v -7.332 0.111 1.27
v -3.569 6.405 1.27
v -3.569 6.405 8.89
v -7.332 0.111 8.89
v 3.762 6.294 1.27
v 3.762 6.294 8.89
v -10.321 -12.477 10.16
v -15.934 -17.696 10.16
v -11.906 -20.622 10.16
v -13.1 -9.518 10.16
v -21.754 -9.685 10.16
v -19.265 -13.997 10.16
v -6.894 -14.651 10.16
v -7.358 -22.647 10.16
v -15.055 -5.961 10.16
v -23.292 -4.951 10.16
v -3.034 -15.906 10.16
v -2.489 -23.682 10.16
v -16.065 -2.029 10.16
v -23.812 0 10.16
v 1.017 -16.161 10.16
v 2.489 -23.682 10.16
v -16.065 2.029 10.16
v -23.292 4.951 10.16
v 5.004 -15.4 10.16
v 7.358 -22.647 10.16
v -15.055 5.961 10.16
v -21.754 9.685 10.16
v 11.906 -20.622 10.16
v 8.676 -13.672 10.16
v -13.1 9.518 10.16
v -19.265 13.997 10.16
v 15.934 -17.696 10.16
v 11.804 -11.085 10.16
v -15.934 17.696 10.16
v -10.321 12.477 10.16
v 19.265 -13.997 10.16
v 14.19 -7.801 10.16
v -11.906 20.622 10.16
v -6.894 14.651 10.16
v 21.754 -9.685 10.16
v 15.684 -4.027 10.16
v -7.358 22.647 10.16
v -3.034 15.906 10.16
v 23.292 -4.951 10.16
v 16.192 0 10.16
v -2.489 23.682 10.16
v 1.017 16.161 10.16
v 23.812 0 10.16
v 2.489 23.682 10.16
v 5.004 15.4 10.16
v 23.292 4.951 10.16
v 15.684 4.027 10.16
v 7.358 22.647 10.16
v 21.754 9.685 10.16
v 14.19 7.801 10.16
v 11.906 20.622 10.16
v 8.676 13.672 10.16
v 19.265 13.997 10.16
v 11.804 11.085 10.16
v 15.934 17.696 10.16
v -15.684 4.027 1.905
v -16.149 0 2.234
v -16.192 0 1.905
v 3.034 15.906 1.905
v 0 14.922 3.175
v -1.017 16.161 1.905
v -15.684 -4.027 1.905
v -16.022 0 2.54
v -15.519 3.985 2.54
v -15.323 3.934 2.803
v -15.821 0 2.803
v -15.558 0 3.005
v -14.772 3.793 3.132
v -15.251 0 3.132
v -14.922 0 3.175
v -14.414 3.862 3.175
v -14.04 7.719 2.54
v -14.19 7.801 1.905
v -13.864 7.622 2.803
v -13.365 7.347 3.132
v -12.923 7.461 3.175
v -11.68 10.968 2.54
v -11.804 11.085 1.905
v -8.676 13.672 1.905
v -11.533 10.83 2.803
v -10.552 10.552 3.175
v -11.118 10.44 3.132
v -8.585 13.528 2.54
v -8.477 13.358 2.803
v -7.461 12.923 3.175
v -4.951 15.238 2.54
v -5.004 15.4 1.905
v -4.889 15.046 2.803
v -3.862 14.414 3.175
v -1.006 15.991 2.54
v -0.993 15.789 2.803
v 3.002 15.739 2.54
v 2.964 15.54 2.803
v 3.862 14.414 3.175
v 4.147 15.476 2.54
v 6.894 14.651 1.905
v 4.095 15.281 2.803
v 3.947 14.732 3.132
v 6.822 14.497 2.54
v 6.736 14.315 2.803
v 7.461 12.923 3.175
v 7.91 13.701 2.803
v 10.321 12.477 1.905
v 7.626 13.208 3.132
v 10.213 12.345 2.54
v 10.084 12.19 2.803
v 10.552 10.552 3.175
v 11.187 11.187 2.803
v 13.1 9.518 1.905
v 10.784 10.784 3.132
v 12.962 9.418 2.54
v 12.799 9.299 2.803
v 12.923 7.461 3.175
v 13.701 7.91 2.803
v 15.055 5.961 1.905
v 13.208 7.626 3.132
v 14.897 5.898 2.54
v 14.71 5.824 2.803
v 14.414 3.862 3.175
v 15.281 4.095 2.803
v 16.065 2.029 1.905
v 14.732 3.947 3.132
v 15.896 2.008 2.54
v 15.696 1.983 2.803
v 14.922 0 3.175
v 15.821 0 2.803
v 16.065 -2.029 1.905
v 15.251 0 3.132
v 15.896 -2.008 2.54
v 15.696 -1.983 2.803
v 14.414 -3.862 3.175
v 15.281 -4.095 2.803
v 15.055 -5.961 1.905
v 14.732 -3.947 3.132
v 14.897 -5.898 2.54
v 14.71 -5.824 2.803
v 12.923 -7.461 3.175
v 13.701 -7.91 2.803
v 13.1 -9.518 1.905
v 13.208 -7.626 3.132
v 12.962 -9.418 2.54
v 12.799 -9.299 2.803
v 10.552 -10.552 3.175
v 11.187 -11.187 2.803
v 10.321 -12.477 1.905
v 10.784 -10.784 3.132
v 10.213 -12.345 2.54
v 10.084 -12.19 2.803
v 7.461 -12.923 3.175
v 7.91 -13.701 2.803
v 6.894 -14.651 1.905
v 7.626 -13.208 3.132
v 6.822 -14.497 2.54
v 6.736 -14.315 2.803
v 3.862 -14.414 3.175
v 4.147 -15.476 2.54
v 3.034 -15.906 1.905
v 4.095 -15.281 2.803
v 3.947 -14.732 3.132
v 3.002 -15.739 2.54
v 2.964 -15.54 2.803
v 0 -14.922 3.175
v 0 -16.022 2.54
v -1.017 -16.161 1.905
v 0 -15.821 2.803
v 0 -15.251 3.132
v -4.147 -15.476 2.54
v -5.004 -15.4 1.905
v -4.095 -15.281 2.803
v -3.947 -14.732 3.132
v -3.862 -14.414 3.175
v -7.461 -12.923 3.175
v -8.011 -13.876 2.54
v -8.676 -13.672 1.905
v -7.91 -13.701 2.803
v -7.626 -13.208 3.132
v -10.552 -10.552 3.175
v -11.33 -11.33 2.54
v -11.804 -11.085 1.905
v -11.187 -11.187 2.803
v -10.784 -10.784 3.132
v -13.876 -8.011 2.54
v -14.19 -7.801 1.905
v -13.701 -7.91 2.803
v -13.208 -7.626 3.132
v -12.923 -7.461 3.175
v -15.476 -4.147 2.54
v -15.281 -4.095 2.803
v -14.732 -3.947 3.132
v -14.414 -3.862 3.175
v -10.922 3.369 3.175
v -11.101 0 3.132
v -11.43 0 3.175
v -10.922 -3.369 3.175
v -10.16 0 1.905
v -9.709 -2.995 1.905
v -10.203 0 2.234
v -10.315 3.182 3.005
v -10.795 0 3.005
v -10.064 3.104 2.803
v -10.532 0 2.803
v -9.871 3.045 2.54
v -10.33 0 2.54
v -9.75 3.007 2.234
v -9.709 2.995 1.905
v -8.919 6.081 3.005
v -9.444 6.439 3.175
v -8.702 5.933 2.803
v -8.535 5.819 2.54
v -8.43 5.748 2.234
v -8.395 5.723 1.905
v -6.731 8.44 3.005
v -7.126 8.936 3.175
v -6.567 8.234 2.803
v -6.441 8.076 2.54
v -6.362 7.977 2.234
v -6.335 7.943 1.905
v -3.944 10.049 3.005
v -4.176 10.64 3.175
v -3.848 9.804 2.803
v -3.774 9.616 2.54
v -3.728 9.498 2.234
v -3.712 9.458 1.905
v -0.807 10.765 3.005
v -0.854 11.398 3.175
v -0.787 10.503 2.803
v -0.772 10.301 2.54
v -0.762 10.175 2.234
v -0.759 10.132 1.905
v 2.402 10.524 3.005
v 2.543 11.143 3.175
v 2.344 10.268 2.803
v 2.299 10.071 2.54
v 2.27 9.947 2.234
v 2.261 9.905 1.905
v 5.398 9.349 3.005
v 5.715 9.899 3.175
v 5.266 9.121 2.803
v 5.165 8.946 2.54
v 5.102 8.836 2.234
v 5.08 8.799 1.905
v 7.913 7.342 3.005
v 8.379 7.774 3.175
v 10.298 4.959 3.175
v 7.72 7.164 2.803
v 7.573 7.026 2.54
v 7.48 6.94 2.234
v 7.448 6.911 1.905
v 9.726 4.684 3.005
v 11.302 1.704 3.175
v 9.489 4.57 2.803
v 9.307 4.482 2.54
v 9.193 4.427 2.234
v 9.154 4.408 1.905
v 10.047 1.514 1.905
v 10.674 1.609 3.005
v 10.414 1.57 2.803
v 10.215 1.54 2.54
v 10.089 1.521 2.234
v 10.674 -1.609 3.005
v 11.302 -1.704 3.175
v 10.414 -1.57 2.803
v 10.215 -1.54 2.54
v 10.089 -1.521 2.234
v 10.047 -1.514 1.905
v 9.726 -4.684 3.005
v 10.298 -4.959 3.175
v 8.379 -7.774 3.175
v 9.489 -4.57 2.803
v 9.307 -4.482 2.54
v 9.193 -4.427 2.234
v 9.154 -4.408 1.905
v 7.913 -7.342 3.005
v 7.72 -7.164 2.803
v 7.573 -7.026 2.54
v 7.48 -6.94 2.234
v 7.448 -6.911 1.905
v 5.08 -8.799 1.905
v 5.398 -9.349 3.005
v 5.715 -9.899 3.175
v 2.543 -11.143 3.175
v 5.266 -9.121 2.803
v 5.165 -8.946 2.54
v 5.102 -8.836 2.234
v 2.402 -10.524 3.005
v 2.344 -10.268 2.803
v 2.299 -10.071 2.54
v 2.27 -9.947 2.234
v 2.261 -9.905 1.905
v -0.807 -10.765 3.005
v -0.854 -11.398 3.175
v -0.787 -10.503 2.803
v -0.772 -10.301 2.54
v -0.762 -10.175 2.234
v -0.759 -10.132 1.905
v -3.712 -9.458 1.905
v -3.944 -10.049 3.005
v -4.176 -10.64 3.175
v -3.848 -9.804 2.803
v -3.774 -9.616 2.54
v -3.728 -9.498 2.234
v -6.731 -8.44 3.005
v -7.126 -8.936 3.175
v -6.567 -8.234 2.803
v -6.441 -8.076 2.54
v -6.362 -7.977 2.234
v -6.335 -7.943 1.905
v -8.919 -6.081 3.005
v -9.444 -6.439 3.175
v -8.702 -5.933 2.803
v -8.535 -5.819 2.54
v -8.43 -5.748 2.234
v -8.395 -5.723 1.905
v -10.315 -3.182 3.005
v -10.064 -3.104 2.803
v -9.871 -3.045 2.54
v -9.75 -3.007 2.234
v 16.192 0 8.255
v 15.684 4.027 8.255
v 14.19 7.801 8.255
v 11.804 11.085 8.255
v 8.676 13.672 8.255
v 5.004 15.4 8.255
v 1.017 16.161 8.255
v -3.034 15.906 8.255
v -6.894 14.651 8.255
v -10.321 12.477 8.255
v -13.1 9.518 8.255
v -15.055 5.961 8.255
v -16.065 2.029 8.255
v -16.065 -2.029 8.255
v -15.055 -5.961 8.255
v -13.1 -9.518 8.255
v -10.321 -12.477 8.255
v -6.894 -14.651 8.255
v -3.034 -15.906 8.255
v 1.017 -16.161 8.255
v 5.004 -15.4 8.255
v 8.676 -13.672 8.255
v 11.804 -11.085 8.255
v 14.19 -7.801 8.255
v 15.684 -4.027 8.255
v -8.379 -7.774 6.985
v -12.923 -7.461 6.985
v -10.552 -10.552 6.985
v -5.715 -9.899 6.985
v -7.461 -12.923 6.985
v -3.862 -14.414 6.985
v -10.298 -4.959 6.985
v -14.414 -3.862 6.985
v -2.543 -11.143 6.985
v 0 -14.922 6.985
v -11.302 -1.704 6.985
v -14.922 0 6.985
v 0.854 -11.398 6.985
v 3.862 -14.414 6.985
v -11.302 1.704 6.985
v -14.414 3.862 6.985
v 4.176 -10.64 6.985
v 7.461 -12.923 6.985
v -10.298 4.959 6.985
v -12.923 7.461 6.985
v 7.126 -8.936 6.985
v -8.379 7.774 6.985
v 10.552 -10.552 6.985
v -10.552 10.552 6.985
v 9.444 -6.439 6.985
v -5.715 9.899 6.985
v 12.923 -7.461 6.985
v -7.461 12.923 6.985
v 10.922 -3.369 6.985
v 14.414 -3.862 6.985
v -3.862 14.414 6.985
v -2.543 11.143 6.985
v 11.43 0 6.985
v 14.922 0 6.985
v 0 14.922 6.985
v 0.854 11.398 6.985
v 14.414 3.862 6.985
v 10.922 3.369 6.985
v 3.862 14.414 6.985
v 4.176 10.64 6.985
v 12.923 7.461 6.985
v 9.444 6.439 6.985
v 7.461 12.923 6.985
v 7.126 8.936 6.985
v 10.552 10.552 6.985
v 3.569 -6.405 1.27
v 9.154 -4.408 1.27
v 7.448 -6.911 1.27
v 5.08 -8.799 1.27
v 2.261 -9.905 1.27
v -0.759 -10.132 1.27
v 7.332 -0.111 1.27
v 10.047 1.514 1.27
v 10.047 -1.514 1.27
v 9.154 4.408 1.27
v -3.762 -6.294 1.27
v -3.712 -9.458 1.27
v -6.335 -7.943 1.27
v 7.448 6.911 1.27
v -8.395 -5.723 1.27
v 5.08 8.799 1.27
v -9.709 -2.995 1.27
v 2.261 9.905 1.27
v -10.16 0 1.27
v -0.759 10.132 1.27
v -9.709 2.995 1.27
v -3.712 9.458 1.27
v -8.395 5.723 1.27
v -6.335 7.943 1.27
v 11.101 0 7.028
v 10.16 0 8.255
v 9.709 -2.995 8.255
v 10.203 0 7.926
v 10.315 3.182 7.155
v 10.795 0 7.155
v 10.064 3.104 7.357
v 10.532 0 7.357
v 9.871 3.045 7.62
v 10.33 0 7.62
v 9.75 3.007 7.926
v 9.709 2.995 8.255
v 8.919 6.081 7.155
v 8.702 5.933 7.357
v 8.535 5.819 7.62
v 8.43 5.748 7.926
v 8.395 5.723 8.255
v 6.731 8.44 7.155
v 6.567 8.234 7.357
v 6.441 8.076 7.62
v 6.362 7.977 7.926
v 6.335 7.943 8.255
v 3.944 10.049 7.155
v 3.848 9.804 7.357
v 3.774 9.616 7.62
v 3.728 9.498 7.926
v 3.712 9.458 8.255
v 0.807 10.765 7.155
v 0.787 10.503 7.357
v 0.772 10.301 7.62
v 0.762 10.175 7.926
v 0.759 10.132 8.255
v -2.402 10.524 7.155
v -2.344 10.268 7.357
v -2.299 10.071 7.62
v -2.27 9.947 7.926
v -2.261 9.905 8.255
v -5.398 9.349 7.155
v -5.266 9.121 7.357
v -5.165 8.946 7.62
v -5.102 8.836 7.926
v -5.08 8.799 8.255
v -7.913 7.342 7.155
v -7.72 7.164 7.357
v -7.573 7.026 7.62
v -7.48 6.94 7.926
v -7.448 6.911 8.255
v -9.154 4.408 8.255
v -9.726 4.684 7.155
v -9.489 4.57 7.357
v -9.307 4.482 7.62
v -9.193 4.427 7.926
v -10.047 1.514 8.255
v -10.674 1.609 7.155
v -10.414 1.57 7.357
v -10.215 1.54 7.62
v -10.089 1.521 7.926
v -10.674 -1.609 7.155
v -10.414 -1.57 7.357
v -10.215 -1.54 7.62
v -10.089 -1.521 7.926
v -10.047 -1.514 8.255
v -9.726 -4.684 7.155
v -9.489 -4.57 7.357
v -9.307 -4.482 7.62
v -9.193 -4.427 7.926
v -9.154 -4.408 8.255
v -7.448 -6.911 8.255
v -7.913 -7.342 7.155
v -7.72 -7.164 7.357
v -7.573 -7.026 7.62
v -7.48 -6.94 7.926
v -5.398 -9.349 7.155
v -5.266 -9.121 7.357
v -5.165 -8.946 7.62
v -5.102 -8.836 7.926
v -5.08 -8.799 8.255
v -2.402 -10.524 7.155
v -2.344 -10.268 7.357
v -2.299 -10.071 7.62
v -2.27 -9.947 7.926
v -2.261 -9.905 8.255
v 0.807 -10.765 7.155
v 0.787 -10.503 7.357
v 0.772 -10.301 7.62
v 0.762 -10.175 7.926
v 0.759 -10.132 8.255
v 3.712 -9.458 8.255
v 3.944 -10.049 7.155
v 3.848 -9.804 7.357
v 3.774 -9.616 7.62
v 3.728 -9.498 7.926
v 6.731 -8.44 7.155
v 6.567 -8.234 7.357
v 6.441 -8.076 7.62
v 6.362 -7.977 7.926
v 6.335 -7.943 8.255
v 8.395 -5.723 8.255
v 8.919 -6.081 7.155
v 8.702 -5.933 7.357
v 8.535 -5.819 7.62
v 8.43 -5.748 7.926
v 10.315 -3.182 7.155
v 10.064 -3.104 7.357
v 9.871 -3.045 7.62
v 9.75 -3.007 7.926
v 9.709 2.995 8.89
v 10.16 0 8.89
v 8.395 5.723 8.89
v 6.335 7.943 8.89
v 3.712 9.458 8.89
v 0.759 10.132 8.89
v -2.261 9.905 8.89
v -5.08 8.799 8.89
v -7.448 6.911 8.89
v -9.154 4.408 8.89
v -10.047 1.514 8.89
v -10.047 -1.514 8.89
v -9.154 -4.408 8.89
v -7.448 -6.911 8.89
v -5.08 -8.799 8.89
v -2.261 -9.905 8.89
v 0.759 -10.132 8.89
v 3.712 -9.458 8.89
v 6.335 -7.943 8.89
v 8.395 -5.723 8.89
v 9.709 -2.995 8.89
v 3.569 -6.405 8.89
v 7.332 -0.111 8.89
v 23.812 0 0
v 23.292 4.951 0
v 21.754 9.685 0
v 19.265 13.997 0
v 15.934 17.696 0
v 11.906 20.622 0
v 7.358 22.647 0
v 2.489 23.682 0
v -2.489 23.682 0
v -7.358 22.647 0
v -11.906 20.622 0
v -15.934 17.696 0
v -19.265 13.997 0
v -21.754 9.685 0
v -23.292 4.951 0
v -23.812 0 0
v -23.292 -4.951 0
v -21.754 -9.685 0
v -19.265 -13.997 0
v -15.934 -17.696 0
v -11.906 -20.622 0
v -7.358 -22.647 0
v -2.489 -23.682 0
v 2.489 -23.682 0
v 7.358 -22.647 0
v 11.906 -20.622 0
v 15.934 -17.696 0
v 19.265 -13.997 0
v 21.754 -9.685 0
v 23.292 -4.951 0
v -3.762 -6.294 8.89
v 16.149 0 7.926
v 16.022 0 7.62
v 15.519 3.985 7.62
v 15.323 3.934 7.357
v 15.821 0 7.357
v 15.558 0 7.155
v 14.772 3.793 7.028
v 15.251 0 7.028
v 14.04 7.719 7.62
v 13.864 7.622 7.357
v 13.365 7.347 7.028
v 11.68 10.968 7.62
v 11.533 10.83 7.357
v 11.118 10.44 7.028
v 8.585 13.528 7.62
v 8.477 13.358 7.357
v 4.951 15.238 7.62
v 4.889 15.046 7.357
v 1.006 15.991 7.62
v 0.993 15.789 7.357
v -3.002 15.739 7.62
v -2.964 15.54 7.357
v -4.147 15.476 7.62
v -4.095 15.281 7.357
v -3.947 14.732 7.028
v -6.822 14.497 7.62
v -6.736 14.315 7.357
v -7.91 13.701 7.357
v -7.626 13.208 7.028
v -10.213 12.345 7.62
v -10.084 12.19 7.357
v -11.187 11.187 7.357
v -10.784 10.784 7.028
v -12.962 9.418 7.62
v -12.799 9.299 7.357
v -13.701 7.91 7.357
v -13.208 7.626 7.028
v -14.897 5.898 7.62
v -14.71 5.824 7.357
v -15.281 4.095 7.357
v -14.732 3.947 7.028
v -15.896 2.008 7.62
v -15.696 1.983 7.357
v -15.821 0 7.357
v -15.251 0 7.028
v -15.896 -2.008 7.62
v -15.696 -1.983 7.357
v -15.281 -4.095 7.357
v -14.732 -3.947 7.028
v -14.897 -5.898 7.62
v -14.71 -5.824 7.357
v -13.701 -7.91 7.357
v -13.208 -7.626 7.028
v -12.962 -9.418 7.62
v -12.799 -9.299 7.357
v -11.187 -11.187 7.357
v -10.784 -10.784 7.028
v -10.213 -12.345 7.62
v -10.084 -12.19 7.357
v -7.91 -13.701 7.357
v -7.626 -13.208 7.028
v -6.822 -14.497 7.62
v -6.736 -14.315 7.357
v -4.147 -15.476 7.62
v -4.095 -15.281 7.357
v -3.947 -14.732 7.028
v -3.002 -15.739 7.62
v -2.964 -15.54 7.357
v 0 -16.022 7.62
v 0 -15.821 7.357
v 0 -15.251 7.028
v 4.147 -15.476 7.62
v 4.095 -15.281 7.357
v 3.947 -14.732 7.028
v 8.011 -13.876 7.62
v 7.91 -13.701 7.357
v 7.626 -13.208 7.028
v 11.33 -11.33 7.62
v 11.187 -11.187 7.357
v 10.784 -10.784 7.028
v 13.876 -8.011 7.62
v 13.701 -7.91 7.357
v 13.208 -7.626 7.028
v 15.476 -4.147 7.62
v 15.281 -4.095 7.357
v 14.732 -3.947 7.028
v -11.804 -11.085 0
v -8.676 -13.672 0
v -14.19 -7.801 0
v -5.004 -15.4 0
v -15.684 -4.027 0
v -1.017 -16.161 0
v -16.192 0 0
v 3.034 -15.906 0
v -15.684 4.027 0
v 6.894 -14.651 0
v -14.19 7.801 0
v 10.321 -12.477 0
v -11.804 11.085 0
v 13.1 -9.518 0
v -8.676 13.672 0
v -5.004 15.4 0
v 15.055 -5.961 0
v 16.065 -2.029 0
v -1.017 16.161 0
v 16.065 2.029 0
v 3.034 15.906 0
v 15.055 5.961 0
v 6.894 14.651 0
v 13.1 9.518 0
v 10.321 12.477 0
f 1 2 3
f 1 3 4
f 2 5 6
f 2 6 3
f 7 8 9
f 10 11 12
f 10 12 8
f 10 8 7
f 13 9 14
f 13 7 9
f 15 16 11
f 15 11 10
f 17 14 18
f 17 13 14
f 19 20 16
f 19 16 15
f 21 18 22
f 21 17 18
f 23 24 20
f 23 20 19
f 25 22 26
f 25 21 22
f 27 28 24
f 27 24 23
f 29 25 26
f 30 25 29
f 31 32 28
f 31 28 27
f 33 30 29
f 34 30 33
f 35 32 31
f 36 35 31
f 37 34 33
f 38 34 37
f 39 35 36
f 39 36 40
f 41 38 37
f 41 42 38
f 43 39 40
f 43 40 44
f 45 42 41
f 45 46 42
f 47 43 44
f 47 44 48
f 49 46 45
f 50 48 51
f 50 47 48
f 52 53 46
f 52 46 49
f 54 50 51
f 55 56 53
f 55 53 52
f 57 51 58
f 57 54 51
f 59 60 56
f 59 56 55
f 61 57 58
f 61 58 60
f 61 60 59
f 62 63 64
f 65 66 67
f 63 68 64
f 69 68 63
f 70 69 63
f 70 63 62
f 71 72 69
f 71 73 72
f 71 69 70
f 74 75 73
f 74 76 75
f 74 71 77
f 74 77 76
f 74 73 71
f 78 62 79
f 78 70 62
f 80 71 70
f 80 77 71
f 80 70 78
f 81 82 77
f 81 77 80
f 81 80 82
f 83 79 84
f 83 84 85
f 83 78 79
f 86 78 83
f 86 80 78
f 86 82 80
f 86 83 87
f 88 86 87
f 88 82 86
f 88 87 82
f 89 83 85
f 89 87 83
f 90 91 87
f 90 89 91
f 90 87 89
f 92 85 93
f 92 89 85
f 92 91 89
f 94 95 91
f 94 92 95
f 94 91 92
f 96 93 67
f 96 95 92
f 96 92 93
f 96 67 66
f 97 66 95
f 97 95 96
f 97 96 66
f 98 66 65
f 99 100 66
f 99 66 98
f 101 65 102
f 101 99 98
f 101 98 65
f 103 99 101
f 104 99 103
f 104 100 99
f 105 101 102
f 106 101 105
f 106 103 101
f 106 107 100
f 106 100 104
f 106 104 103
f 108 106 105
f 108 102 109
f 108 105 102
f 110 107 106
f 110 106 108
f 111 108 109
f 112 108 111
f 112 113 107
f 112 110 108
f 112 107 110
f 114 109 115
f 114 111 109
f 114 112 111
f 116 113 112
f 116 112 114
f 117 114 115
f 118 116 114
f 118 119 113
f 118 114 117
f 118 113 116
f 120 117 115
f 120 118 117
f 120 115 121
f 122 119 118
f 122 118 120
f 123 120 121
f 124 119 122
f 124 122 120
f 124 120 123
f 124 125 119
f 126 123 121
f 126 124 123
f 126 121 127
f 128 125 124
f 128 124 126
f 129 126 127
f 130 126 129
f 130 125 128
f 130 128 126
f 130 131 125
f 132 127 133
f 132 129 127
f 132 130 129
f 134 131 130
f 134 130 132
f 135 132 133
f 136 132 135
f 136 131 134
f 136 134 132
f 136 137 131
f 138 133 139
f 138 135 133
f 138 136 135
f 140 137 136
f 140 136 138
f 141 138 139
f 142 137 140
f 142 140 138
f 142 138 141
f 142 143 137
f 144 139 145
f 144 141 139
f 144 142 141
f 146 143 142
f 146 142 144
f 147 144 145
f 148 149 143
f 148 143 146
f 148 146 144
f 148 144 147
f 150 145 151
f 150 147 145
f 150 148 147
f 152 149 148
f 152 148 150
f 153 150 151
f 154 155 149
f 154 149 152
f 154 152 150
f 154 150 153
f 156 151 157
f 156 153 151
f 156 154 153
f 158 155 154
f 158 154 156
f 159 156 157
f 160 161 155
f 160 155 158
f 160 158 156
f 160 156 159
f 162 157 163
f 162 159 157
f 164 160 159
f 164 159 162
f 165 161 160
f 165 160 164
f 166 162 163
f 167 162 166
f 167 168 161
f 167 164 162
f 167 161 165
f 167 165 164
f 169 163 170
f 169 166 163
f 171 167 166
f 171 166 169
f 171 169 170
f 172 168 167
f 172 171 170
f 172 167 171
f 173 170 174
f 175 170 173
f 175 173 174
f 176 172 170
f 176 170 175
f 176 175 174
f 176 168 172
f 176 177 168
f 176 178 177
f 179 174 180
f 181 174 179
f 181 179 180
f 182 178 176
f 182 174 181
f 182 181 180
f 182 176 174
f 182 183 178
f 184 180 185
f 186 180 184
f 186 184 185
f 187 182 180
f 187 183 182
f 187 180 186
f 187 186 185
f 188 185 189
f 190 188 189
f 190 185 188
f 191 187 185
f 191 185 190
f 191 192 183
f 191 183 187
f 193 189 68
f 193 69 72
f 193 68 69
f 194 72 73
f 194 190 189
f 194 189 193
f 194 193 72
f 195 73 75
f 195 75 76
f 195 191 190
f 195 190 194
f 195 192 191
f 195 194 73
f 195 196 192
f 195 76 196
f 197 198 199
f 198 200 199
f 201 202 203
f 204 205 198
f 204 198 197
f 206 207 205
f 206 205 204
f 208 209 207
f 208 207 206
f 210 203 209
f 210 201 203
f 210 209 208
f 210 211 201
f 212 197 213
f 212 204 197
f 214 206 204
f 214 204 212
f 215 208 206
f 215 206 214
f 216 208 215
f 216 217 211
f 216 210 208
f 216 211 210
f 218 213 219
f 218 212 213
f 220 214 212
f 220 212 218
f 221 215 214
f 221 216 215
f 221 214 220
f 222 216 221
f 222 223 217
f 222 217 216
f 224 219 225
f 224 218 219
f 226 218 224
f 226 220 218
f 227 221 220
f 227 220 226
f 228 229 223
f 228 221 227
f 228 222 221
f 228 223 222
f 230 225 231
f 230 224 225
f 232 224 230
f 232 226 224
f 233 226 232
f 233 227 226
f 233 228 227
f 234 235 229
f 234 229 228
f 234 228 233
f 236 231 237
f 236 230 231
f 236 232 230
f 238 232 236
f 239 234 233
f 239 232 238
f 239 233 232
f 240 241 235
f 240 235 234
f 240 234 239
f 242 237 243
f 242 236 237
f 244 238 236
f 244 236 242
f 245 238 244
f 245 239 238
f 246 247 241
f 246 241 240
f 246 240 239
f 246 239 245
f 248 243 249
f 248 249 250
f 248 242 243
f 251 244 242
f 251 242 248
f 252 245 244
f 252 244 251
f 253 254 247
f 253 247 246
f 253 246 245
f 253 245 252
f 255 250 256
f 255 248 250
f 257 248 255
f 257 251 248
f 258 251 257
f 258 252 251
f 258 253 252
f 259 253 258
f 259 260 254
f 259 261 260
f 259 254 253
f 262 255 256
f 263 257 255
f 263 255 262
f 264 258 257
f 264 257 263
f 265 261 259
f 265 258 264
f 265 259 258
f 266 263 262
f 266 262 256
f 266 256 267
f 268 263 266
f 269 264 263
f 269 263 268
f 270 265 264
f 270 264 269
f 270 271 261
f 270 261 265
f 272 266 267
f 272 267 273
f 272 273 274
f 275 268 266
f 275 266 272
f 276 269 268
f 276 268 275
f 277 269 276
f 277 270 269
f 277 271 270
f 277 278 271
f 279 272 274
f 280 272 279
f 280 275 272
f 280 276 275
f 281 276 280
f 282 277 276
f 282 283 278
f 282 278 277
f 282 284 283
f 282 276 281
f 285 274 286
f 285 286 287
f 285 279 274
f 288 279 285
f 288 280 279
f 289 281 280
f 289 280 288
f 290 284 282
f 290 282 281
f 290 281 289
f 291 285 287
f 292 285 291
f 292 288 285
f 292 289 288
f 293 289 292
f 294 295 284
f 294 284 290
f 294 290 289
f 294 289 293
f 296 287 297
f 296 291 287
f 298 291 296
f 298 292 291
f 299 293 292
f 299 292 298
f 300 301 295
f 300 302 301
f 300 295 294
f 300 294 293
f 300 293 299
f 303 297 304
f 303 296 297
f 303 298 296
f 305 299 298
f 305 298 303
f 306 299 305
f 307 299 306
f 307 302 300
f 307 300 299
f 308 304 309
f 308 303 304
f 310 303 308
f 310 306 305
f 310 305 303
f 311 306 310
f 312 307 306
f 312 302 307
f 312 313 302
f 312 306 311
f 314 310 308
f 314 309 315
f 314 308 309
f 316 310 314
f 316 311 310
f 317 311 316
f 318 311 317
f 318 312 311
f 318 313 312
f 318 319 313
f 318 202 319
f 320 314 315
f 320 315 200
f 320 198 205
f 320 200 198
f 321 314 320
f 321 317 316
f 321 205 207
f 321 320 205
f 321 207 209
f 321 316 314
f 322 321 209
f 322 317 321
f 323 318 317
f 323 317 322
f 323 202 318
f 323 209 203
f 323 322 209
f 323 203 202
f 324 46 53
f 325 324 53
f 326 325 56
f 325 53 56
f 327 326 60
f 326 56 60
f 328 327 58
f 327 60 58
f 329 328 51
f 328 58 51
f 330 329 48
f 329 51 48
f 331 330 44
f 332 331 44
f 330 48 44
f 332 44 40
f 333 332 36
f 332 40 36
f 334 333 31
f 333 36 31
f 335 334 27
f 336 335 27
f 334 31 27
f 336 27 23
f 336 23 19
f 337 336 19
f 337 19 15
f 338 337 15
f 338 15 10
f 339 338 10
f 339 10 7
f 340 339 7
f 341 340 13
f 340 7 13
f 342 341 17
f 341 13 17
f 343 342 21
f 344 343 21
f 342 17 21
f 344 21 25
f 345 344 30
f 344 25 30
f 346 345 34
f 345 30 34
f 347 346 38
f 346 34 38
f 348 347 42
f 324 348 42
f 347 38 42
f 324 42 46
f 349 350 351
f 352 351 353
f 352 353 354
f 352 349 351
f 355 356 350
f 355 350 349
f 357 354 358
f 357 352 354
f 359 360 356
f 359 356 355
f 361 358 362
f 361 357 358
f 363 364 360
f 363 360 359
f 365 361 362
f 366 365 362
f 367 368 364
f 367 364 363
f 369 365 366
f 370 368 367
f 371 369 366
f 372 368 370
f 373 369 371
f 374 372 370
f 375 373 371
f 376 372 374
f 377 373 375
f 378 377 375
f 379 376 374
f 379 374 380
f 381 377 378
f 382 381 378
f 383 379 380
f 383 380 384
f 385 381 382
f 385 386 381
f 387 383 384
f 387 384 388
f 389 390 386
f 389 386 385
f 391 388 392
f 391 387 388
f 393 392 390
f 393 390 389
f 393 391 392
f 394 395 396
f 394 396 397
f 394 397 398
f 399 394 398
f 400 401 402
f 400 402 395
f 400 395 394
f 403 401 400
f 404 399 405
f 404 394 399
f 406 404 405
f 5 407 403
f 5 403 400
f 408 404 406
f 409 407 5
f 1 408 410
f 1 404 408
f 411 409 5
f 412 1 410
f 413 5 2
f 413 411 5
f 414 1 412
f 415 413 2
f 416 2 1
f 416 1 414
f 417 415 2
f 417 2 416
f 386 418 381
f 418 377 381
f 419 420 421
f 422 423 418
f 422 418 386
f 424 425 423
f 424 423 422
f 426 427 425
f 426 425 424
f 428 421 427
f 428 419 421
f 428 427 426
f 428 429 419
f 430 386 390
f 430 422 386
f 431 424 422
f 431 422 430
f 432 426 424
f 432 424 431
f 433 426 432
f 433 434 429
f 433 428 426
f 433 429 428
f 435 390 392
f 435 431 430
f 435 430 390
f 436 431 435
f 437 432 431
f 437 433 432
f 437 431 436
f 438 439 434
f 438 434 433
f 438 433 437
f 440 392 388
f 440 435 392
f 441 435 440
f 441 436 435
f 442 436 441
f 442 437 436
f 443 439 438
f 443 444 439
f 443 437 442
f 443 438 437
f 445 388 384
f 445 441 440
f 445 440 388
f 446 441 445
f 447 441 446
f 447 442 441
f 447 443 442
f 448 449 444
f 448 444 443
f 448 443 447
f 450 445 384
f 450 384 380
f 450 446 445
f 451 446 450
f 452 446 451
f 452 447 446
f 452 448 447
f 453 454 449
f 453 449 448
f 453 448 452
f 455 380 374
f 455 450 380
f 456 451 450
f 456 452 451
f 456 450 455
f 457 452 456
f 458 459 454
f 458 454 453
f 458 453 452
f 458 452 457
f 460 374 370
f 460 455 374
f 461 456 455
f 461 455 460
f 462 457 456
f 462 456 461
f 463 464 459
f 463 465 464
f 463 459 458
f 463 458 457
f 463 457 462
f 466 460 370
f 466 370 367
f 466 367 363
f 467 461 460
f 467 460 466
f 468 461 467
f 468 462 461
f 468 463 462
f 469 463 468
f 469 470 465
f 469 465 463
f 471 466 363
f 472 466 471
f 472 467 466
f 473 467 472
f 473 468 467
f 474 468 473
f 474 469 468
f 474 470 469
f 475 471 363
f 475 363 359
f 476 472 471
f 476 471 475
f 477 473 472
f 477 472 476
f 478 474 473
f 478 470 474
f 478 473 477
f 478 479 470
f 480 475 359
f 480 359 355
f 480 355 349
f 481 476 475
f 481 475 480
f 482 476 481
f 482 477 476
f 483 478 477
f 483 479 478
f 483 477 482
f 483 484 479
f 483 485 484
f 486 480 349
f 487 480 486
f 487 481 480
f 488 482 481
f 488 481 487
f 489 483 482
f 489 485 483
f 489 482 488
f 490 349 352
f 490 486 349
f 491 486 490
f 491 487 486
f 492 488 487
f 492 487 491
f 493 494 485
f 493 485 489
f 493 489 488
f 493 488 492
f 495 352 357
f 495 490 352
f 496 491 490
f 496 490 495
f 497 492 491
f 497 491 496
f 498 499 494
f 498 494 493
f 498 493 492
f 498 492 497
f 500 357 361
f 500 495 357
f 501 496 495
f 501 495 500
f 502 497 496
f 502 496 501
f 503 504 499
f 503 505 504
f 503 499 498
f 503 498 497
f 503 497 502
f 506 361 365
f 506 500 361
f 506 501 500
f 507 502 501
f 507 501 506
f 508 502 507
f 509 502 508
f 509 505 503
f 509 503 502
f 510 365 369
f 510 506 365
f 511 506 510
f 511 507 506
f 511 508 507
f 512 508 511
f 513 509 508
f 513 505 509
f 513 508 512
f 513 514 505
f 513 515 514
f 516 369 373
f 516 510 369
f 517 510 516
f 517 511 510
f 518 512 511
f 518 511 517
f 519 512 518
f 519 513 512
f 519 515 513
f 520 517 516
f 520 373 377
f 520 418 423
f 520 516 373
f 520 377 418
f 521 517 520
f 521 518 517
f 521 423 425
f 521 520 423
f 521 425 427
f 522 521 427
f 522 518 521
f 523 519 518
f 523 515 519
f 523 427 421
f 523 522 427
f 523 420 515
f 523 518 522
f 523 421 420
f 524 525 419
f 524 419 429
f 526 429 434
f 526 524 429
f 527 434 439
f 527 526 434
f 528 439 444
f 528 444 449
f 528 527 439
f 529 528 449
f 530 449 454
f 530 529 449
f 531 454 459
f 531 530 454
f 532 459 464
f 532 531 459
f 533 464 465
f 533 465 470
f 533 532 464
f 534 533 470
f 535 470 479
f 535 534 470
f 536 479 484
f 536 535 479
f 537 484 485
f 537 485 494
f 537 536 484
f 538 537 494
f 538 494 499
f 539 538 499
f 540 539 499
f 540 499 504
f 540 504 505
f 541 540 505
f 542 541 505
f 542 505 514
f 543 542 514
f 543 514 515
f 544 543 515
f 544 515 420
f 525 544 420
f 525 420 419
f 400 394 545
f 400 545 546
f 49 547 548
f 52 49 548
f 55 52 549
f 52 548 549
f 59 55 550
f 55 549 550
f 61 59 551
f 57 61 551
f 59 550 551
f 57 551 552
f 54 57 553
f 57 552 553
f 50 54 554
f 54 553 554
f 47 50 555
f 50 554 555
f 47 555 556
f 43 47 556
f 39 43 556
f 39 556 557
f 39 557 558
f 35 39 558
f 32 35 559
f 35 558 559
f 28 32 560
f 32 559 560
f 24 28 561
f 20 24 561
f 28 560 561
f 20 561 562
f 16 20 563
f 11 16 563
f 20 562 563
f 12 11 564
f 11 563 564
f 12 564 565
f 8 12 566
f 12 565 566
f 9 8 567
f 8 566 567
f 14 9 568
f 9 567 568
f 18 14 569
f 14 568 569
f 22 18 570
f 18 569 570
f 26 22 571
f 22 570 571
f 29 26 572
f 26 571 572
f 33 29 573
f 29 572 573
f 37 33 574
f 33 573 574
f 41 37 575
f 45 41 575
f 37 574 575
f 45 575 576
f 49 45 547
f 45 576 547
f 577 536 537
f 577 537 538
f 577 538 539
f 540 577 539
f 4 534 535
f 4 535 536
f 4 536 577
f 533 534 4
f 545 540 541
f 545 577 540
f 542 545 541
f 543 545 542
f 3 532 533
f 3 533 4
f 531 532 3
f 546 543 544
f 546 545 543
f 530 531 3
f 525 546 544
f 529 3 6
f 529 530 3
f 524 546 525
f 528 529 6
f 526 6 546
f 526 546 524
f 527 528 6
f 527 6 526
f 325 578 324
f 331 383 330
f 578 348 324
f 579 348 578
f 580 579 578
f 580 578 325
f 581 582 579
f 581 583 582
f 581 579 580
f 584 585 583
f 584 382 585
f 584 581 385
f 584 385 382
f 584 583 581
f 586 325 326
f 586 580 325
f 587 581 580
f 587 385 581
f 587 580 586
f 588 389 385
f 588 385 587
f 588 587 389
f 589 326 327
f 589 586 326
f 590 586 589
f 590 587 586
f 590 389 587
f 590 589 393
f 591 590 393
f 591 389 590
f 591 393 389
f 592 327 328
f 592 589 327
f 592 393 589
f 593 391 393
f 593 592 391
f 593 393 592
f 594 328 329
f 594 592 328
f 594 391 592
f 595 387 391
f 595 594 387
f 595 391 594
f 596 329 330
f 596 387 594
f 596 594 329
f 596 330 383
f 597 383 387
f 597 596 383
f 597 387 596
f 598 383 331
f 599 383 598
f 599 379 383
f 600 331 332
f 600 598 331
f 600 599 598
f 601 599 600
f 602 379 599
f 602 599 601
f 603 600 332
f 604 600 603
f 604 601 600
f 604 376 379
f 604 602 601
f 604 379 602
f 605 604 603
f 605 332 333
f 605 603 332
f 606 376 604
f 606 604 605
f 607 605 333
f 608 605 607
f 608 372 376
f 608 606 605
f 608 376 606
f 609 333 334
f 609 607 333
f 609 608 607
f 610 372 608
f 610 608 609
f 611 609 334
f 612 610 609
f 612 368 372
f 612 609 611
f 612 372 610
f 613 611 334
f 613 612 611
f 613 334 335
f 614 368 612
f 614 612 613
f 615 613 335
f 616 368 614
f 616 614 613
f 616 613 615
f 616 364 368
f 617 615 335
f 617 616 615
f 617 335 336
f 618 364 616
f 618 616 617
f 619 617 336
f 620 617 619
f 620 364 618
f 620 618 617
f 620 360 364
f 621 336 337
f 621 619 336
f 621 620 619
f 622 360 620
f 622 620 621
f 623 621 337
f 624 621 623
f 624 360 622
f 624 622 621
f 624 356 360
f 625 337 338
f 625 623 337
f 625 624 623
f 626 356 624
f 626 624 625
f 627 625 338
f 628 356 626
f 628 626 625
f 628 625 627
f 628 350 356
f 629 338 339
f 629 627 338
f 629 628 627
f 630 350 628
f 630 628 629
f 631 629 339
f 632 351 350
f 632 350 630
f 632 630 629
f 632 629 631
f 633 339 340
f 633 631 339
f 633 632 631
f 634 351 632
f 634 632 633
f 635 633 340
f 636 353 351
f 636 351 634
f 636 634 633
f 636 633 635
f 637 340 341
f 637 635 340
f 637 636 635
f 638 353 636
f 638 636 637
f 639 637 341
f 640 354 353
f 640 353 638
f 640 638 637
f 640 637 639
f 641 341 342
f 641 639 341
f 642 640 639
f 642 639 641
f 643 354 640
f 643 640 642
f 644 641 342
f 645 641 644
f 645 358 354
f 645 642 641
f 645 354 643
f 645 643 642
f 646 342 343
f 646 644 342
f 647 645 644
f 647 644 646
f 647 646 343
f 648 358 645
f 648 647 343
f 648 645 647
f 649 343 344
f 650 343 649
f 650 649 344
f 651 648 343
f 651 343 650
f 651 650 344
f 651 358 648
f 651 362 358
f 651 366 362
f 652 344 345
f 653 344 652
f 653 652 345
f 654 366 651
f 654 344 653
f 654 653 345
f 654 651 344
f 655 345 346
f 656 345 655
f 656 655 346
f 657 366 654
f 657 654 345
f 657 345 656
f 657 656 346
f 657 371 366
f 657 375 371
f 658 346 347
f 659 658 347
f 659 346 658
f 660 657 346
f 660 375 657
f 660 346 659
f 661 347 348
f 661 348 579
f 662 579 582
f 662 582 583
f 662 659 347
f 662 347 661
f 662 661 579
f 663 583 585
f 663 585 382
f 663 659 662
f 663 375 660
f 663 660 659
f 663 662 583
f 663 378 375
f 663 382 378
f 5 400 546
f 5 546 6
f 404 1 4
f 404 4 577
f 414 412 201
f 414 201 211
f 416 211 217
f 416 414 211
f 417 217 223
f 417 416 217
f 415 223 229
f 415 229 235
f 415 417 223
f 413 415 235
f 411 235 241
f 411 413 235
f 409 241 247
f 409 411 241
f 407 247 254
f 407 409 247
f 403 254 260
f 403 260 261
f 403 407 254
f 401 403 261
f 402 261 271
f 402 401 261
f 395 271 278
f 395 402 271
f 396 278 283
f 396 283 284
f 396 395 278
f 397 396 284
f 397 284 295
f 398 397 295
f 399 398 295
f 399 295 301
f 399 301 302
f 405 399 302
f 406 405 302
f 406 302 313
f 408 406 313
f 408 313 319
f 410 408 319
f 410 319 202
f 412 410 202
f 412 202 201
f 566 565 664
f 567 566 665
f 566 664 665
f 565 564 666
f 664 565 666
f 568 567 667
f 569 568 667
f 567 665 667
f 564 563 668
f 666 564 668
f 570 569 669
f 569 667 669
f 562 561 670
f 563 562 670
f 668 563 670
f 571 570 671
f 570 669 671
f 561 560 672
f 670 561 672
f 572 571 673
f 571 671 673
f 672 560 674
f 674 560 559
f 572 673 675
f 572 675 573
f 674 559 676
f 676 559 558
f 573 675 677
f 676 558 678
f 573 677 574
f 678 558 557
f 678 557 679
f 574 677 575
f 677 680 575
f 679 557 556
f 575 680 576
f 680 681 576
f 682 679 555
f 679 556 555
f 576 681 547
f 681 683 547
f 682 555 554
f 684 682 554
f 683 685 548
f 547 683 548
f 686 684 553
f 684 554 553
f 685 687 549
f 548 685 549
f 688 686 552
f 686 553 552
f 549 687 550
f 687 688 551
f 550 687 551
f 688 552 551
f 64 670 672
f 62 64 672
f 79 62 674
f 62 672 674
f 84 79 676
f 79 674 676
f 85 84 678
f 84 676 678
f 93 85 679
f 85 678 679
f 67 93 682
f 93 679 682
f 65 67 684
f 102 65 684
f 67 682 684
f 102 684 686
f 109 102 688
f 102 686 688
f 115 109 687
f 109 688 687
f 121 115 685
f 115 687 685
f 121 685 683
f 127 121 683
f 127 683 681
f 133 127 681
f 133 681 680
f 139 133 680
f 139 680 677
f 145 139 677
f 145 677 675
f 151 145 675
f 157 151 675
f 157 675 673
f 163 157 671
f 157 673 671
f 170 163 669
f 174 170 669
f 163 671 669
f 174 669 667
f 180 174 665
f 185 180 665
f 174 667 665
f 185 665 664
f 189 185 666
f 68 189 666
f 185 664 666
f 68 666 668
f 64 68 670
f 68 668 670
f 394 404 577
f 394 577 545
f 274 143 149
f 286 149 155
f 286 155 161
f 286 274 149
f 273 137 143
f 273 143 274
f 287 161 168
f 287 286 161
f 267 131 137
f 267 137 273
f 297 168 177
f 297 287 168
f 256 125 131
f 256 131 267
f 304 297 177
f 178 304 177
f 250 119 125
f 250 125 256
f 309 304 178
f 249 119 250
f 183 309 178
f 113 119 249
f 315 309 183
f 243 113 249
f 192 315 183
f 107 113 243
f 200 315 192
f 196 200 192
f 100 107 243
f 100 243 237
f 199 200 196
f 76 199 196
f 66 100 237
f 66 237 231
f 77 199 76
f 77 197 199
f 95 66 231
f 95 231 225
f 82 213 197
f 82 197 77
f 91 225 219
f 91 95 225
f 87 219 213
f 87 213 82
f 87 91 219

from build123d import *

# Parameters (mm, degrees)
SKETCH1_R           = 23.8125
BOSS_EXTRUDE1_DEPTH = 10.16
SKETCH2_R           = 16.1925
SKETCH2_R_2         = 10.16
CUT_EXTRUDE1_DEPTH  = 3.175
SKETCH3_R           = 16.1925
SKETCH3_R_2         = 10.16
CUT_EXTRUDE2_DEPTH  = 3.175
SKETCH4_R           = 10.16
CUT_EXTRUDE3_DEPTH  = 1.27
SKETCH7_R           = 10.16
CUT_EXTRUDE5_DEPTH  = 1.27
FILLET1_R           = 1.27


with BuildPart() as part:
    # Sketch1 → Boss-Extrude1 (new body)
    with BuildSketch(Plane.XY):
        Circle(SKETCH1_R)
        Polygon((3.569234353, -6.4049902), (7.331501401, -0.111447478), (3.762267048, 6.293542722), (-3.569234353, 6.4049902), (-7.331501401, 0.111447478), (-3.762267048, -6.293542722), align=None, mode=Mode.SUBTRACT)
    extrude(amount=BOSS_EXTRUDE1_DEPTH)

    # Sketch2 → Cut-Extrude1 (cut)
    with BuildSketch(Plane.XY.offset(10.16)):
        Circle(SKETCH2_R)
        Circle(SKETCH2_R_2, mode=Mode.SUBTRACT)
    extrude(amount=-CUT_EXTRUDE1_DEPTH, mode=Mode.SUBTRACT)

    # Sketch3 → Cut-Extrude2 (cut)
    with BuildSketch(Plane(origin=(0, 0, 0), x_dir=(-1, 0, 0), z_dir=(0, 0, -1))):
        Circle(SKETCH3_R)
        Circle(SKETCH3_R_2, mode=Mode.SUBTRACT)
    extrude(amount=-CUT_EXTRUDE2_DEPTH, mode=Mode.SUBTRACT)

    # Sketch4 → Cut-Extrude3 (cut)
    with BuildSketch(Plane(origin=(0, 0, 0), x_dir=(-1, 0, 0), z_dir=(0, 0, -1))):
        Circle(SKETCH4_R)
    extrude(amount=-CUT_EXTRUDE3_DEPTH, mode=Mode.SUBTRACT)

    # Sketch7 → Cut-Extrude5 (cut)
    with BuildSketch(Plane.XY.offset(10.16)):
        Circle(SKETCH7_R)
    extrude(amount=-CUT_EXTRUDE5_DEPTH, mode=Mode.SUBTRACT)

    # Fillet1
    fillet1_edges = [part.edges().sort_by_distance(p)[0] for p in [
        (-16.1925, 0, 6.985),
        (-10.16, 0, 6.985),
        (16.1925, 0, 3.175),
        (10.16, 0, 3.175),
    ]]
    fillet(fillet1_edges, radius=FILLET1_R)


solid = part.part
